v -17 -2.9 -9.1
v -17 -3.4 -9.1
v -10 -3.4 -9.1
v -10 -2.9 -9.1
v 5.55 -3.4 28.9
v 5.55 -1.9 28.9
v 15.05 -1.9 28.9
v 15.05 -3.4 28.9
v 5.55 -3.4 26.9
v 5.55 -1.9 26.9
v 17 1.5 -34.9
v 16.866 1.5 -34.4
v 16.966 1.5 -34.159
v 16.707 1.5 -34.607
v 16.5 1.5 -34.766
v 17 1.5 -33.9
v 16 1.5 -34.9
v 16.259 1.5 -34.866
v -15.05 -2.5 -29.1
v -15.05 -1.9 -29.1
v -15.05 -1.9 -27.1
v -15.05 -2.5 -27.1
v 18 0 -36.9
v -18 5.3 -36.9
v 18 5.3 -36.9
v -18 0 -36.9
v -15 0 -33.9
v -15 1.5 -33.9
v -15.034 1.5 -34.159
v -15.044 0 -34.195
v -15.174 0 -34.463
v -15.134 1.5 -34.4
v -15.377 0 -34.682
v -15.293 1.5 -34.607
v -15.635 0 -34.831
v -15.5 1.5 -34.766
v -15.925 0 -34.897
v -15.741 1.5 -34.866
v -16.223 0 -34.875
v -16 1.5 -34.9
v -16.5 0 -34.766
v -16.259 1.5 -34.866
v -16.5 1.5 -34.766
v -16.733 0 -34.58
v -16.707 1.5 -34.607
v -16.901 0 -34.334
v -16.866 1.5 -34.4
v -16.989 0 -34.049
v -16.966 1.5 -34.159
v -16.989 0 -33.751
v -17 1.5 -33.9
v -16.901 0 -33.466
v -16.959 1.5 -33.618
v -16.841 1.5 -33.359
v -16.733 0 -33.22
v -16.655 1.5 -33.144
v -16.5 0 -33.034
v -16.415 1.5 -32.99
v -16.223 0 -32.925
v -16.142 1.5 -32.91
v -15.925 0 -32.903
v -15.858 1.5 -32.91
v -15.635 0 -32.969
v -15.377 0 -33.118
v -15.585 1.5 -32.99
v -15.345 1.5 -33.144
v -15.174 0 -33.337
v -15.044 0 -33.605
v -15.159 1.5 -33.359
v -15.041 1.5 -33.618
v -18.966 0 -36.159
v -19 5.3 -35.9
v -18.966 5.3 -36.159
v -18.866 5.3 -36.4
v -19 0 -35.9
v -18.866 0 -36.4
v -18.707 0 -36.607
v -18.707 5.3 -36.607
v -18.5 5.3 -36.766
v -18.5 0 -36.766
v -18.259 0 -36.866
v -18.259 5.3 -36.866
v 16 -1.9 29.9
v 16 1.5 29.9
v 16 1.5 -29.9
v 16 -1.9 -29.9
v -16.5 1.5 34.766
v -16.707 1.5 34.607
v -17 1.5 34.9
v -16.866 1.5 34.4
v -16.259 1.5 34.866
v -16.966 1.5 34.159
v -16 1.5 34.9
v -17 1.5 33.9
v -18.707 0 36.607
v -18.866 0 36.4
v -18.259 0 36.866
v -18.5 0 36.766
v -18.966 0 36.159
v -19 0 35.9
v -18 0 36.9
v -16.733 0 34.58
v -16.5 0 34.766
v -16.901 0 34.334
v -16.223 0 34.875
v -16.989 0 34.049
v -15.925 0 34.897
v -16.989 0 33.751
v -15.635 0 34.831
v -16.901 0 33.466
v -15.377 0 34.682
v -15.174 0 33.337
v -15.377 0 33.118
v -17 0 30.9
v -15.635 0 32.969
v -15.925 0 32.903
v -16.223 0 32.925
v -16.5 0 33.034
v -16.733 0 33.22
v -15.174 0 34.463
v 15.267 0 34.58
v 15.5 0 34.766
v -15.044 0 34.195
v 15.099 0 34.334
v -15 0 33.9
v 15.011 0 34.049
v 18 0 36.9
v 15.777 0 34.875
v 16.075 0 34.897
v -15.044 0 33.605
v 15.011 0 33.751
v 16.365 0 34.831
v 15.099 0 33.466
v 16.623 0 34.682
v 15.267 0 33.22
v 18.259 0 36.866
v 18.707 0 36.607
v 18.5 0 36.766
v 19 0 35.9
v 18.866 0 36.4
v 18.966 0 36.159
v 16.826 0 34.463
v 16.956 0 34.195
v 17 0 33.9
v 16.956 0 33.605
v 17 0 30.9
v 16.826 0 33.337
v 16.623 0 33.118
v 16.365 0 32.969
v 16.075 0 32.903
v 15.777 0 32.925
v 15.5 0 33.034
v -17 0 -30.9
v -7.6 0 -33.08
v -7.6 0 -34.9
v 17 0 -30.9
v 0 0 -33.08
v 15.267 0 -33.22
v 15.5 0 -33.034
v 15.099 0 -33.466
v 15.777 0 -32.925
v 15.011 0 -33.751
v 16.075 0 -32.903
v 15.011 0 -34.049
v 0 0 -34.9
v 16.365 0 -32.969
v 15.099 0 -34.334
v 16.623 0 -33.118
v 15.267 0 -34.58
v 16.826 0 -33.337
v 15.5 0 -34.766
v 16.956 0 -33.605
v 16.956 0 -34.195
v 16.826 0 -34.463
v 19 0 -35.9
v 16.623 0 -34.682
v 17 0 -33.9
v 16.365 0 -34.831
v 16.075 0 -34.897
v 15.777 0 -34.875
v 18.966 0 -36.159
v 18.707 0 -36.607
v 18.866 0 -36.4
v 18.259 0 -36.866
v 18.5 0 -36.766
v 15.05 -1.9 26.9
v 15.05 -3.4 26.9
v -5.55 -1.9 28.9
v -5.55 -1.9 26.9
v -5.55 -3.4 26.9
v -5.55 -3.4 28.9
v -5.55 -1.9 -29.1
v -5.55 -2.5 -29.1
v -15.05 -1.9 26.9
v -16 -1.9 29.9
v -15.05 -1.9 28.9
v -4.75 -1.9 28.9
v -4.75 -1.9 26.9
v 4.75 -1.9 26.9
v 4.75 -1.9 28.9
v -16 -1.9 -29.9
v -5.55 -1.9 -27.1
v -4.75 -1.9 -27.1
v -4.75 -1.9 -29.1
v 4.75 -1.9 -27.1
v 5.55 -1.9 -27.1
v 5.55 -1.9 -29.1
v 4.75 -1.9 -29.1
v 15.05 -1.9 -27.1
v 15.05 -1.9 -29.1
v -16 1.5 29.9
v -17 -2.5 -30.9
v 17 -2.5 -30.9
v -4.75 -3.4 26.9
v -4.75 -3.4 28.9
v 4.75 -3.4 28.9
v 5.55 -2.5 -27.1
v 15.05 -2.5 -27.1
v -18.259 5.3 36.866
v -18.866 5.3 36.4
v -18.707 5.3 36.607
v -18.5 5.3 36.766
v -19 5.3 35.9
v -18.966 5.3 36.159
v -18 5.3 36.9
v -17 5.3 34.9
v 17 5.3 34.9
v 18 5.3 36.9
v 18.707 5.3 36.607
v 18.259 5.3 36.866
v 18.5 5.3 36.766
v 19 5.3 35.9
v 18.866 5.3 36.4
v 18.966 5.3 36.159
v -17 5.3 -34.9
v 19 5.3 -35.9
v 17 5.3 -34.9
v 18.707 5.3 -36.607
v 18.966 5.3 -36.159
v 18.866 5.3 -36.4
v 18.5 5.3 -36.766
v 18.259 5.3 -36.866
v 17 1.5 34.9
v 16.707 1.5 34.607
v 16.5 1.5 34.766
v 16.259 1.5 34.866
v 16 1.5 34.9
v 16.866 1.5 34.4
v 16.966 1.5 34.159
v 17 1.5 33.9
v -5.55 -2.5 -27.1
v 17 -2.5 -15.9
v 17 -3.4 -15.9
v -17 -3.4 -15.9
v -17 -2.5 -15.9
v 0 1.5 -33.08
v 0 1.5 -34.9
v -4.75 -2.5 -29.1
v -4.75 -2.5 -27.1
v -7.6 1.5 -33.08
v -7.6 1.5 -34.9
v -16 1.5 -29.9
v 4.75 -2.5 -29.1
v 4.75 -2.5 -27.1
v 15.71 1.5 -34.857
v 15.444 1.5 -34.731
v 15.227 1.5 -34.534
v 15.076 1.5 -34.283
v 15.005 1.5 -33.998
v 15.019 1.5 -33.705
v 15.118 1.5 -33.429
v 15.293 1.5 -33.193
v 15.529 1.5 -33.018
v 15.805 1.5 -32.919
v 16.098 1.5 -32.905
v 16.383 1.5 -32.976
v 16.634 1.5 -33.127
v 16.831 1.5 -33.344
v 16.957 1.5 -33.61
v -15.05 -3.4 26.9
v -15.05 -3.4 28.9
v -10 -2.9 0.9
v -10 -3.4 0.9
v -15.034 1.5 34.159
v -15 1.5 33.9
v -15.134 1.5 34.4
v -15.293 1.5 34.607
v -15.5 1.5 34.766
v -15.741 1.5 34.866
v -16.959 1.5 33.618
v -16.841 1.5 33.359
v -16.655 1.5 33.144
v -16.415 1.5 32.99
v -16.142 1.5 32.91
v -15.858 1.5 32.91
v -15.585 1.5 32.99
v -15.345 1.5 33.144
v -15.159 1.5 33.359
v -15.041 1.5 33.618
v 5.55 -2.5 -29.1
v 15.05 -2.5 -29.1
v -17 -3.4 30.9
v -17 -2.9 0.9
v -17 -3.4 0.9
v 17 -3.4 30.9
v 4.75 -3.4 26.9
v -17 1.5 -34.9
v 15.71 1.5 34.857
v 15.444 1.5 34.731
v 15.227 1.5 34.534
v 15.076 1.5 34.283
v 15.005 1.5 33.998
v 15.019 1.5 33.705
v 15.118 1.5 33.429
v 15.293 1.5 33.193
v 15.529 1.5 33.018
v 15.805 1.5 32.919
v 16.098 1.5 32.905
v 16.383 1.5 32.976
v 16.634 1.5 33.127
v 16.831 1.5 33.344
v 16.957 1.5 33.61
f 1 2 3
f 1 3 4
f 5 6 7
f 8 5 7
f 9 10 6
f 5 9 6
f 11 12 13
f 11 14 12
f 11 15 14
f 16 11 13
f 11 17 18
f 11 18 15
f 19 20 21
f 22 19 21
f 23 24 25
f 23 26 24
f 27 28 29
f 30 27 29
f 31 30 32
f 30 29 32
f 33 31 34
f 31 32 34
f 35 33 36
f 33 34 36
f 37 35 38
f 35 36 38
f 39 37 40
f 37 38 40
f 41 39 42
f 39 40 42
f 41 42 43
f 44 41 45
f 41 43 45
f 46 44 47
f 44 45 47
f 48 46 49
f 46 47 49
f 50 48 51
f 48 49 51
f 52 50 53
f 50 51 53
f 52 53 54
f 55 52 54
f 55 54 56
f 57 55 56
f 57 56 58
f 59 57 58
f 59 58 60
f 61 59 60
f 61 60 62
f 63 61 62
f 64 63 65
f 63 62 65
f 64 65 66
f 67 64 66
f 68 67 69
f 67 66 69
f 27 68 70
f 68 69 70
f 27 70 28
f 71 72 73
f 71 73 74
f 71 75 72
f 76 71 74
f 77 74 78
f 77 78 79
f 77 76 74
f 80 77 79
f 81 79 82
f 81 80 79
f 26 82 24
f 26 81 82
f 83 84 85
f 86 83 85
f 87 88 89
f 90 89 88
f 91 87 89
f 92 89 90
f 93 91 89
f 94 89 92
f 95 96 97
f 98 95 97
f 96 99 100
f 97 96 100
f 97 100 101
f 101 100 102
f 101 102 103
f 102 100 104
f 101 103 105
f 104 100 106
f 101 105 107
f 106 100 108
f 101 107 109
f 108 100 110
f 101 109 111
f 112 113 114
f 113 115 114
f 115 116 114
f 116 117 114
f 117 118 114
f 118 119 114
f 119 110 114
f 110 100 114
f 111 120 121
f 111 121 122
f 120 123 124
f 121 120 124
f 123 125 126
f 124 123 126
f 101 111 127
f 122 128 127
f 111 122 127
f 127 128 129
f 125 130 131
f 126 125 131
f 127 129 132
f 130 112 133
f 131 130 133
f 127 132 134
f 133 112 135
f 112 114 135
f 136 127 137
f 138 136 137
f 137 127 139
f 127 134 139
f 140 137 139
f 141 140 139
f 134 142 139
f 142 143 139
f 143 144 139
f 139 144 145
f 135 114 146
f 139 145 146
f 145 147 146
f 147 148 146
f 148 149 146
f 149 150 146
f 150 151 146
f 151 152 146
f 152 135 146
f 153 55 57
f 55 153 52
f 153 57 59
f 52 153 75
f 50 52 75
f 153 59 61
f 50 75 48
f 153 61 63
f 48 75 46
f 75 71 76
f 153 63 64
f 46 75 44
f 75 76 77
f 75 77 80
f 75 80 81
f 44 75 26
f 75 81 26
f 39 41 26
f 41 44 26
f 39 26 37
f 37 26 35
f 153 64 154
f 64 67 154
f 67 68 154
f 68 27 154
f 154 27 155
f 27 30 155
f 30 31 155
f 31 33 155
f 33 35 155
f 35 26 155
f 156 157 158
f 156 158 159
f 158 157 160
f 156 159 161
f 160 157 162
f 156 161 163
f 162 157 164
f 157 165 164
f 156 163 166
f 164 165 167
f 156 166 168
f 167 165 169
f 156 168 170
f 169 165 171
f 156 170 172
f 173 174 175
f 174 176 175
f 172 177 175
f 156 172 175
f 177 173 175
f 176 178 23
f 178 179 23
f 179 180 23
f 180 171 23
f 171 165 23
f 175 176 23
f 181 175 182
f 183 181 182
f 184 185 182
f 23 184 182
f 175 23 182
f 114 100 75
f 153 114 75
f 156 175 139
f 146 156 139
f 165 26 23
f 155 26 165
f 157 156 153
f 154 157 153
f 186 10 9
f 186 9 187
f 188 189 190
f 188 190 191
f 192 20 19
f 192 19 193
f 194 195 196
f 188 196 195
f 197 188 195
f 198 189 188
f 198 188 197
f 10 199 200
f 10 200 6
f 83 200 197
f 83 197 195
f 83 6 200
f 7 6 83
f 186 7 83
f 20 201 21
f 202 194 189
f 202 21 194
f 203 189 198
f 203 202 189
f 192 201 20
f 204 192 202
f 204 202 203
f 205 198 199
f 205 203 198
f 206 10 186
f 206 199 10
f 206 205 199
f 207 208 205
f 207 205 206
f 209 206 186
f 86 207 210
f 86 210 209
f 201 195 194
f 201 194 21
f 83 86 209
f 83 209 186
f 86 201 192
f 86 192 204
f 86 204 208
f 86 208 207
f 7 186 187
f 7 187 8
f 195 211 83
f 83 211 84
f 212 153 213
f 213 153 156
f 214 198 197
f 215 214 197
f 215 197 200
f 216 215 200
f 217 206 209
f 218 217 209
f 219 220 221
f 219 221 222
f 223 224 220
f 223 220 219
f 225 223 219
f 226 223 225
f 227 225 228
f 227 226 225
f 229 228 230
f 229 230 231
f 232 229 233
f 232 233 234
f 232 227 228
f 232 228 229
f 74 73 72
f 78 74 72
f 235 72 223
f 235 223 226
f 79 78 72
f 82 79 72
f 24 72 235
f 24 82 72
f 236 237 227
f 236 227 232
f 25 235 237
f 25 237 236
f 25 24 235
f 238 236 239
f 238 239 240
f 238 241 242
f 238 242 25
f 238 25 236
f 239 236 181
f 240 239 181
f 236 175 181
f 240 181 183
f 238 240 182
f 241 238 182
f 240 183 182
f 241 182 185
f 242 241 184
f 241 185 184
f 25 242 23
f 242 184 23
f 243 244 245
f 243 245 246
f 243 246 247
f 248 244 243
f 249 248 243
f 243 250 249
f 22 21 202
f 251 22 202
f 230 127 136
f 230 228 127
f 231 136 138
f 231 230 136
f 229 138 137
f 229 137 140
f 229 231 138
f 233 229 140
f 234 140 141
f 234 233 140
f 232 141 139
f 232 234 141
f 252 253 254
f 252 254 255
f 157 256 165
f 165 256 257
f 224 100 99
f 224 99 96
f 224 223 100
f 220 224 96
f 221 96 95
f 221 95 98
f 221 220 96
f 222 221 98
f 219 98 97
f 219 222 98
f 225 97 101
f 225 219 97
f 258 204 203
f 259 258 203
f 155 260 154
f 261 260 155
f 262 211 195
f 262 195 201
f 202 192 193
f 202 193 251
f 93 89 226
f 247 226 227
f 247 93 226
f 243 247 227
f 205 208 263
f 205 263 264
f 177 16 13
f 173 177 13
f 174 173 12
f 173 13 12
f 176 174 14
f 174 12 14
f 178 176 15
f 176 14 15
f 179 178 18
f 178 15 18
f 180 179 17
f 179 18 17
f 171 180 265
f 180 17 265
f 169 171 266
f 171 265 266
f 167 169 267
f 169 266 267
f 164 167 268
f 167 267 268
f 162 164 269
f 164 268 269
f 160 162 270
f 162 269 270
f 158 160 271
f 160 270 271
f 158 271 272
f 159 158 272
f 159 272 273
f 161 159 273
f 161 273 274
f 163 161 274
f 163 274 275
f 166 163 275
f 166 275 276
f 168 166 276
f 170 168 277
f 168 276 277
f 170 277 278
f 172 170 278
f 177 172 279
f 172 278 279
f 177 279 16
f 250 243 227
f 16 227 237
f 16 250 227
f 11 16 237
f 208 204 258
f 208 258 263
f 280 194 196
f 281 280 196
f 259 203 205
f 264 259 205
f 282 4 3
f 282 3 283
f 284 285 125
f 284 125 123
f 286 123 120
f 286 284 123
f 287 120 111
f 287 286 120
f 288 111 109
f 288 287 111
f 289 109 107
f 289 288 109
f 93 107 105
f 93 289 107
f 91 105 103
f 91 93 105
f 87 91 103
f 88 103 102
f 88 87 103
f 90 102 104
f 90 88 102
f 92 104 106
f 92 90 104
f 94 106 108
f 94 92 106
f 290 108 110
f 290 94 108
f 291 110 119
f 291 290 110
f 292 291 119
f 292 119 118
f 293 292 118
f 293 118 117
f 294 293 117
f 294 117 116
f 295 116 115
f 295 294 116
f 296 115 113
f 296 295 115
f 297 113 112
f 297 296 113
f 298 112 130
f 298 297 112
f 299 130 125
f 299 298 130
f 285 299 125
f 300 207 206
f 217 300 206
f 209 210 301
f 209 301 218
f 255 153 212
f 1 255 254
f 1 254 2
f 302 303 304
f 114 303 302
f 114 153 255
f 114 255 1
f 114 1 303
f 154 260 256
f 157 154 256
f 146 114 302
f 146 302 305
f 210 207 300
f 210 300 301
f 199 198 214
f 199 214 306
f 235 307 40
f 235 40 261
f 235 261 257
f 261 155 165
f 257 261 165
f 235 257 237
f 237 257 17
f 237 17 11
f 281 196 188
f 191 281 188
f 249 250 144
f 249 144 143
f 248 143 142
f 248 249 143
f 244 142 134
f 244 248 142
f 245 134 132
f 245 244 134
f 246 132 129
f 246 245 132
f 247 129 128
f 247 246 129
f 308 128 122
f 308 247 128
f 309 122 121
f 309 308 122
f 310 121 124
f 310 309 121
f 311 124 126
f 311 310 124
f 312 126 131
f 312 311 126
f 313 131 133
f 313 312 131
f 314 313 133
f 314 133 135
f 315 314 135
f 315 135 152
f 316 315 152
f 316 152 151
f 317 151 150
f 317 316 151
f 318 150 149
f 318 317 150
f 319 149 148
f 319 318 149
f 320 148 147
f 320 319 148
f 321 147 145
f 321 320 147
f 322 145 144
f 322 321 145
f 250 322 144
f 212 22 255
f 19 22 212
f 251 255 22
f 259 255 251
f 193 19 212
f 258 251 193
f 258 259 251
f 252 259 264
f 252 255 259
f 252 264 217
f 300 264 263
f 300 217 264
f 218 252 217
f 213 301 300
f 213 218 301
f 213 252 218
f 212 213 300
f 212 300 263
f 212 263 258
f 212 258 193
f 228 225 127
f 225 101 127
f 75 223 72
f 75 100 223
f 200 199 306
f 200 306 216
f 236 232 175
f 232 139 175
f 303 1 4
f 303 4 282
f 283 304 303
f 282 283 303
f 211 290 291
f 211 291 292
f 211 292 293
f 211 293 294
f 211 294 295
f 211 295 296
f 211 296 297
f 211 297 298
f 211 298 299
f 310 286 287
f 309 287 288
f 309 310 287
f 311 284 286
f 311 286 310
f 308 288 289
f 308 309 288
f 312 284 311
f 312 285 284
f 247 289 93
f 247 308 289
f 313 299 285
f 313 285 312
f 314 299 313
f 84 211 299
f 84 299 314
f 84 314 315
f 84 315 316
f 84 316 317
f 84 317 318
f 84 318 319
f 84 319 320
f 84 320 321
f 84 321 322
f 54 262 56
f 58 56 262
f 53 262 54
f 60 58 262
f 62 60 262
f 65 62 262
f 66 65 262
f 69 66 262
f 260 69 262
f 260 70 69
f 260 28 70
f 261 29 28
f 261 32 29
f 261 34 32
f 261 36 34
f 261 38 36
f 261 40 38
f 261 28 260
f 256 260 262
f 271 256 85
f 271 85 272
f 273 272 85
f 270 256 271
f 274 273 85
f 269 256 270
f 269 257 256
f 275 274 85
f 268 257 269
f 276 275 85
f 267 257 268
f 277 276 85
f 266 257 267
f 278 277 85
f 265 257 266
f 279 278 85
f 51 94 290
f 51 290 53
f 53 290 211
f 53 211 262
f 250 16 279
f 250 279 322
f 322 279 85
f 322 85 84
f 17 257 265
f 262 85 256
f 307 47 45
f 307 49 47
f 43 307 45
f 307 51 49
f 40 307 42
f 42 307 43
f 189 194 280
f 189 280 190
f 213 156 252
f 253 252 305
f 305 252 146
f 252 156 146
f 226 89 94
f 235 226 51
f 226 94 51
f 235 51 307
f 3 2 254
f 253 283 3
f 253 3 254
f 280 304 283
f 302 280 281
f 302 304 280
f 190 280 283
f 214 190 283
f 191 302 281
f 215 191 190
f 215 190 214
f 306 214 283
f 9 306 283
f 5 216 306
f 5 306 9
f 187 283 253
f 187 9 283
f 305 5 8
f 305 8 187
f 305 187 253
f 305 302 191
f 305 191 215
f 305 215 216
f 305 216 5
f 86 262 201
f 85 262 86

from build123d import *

# Parameters (mm, degrees)
SKETCH1_W           = 38
SKETCH1_H           = 73.8
BOSS_EXTRUDE1_DEPTH = 1.5
SKETCH2_W           = 38
SKETCH2_H           = 73.8
SKETCH2_W_2         = 34
SKETCH2_H_2         = 69.8
BOSS_EXTRUDE2_DEPTH = 3.8
FILLET1_R           = 1
SKETCH3_R           = 1
CUT_EXTRUDE1_DEPTH  = 2.5
SKETCH4_W           = 7.6
SKETCH4_H           = 1.82
CUT_EXTRUDE2_DEPTH  = 2.5
SKETCH5_W           = 9.5
SKETCH5_H           = 2
CUT_EXTRUDE3_DEPTH  = 2.5
LPATTERN1_COUNT     = 2
LPATTERN1_PITCH     = 56
SKETCH6_W           = 34
SKETCH6_H           = 61.8
SKETCH6_W_2         = 9.5
SKETCH6_H_2         = 2
BOSS_EXTRUDE3_DEPTH = 3.4
SKETCH7_W           = 32
SKETCH7_H           = 59.8
CUT_EXTRUDE5_DEPTH  = 3.4
SKETCH9_W           = 15
SKETCH9_H           = 0.9
CUT_EXTRUDE7_DEPTH  = 37
SKETCH10_W          = 10
SKETCH10_H          = 0.5
CUT_EXTRUDE8_DEPTH  = 7


with BuildPart() as part:
    # Sketch1 → Boss-Extrude1 (new body)
    with BuildSketch(Plane(origin=(0, 0, 0), x_dir=(1, 0, 0), z_dir=(0, 1, 0))):
        Rectangle(SKETCH1_W, SKETCH1_H)
    extrude(amount=BOSS_EXTRUDE1_DEPTH)

    # Sketch2 → Boss-Extrude2 (add)
    with BuildSketch(Plane(origin=(0, 1.5, 0), x_dir=(1, 0, 0), z_dir=(0, 1, 0))):
        Rectangle(SKETCH2_W, SKETCH2_H)
        Rectangle(SKETCH2_W_2, SKETCH2_H_2, mode=Mode.SUBTRACT)
    extrude(amount=BOSS_EXTRUDE2_DEPTH)

    # Fillet1
    fillet1_edges = [part.edges().sort_by_distance(p)[0] for p in [
        (19, 2.65, 36.9),
        (-19, 2.65, 36.9),
        (-19, 2.65, -36.9),
        (19, 2.65, -36.9),
    ]]
    fillet(fillet1_edges, radius=FILLET1_R)

    # Sketch3 → Cut-Extrude1 (cut, through all)
    with BuildSketch(Plane(origin=(0, 1.5, 0), x_dir=(1, 0, 0), z_dir=(0, 1, 0))):
        with Locations((-16, 33.9)):
            Circle(SKETCH3_R)
        with Locations((16, 33.9)):
            Circle(SKETCH3_R)
    cut_extrude1 = extrude(amount=-CUT_EXTRUDE1_DEPTH, mode=Mode.SUBTRACT)

    # Mirror1: Cut-Extrude1 across plane
    add(cut_extrude1.mirror(Plane.XY), mode=Mode.SUBTRACT)

    # Sketch4 → Cut-Extrude2 (cut, through all)
    with BuildSketch(Plane(origin=(0, 1.5, 0), x_dir=(1, 0, 0), z_dir=(0, 1, 0))):
        with Locations((-3.8, 33.99)):
            Rectangle(SKETCH4_W, SKETCH4_H)
    extrude(amount=-CUT_EXTRUDE2_DEPTH, mode=Mode.SUBTRACT)

    # Sketch5 → Cut-Extrude3 (cut, through all)
    with BuildSketch(Plane(origin=(0, 1.5, 0), x_dir=(1, 0, 0), z_dir=(0, 1, 0))):
        with Locations((-10.3, 28.1)):
            Rectangle(SKETCH5_W, SKETCH5_H)
        with Locations((0, 28.1)):
            Rectangle(SKETCH5_W, SKETCH5_H)
        with Locations((10.3, 28.1)):
            Rectangle(SKETCH5_W, SKETCH5_H)
    cut_extrude3 = extrude(amount=-CUT_EXTRUDE3_DEPTH, mode=Mode.SUBTRACT)

    # LPattern1: Cut-Extrude3 ×2
    with Locations(*[(0, 0, i * LPATTERN1_PITCH) for i in range(1, LPATTERN1_COUNT)]):
        add(cut_extrude3, mode=Mode.SUBTRACT)

    # Sketch6 → Boss-Extrude3 (add)
    with BuildSketch(Plane.XZ):
        Rectangle(SKETCH6_W, SKETCH6_H)
        with Locations((-10.3, 27.9)):
            Rectangle(SKETCH6_W_2, SKETCH6_H_2, mode=Mode.SUBTRACT)
        with Locations((0, 27.9)):
            Rectangle(SKETCH6_W_2, SKETCH6_H_2, mode=Mode.SUBTRACT)
        with Locations((10.3, 27.9)):
            Rectangle(SKETCH6_W_2, SKETCH6_H_2, mode=Mode.SUBTRACT)
        with Locations((-10.3, -28.1)):
            Rectangle(SKETCH6_W_2, SKETCH6_H_2, mode=Mode.SUBTRACT)
        with Locations((0, -28.1)):
            Rectangle(SKETCH6_W_2, SKETCH6_H_2, mode=Mode.SUBTRACT)
        with Locations((10.3, -28.1)):
            Rectangle(SKETCH6_W_2, SKETCH6_H_2, mode=Mode.SUBTRACT)
    extrude(amount=BOSS_EXTRUDE3_DEPTH)

    # Sketch7 → Cut-Extrude5 (cut)
    with BuildSketch(Plane(origin=(0, 1.5, 0), x_dir=(1, 0, 0), z_dir=(0, 1, 0))):
        Rectangle(SKETCH7_W, SKETCH7_H)
    extrude(amount=-CUT_EXTRUDE5_DEPTH, mode=Mode.SUBTRACT)

    # Sketch9 → Cut-Extrude7 (cut, through all)
    with BuildSketch(Plane(origin=(17, 0, 0), x_dir=(0, 0, -1), z_dir=(1, 0, 0))):
        with Locations((23.4, -2.95)):
            Rectangle(SKETCH9_W, SKETCH9_H)
    extrude(amount=-CUT_EXTRUDE7_DEPTH, mode=Mode.SUBTRACT)

    # Sketch10 → Cut-Extrude8 (cut)
    with BuildSketch(Plane.ZY.offset(17)):
        with Locations((-4.1, -3.15)):
            Rectangle(SKETCH10_W, SKETCH10_H)
    extrude(amount=-CUT_EXTRUDE8_DEPTH, mode=Mode.SUBTRACT)


solid = part.part
